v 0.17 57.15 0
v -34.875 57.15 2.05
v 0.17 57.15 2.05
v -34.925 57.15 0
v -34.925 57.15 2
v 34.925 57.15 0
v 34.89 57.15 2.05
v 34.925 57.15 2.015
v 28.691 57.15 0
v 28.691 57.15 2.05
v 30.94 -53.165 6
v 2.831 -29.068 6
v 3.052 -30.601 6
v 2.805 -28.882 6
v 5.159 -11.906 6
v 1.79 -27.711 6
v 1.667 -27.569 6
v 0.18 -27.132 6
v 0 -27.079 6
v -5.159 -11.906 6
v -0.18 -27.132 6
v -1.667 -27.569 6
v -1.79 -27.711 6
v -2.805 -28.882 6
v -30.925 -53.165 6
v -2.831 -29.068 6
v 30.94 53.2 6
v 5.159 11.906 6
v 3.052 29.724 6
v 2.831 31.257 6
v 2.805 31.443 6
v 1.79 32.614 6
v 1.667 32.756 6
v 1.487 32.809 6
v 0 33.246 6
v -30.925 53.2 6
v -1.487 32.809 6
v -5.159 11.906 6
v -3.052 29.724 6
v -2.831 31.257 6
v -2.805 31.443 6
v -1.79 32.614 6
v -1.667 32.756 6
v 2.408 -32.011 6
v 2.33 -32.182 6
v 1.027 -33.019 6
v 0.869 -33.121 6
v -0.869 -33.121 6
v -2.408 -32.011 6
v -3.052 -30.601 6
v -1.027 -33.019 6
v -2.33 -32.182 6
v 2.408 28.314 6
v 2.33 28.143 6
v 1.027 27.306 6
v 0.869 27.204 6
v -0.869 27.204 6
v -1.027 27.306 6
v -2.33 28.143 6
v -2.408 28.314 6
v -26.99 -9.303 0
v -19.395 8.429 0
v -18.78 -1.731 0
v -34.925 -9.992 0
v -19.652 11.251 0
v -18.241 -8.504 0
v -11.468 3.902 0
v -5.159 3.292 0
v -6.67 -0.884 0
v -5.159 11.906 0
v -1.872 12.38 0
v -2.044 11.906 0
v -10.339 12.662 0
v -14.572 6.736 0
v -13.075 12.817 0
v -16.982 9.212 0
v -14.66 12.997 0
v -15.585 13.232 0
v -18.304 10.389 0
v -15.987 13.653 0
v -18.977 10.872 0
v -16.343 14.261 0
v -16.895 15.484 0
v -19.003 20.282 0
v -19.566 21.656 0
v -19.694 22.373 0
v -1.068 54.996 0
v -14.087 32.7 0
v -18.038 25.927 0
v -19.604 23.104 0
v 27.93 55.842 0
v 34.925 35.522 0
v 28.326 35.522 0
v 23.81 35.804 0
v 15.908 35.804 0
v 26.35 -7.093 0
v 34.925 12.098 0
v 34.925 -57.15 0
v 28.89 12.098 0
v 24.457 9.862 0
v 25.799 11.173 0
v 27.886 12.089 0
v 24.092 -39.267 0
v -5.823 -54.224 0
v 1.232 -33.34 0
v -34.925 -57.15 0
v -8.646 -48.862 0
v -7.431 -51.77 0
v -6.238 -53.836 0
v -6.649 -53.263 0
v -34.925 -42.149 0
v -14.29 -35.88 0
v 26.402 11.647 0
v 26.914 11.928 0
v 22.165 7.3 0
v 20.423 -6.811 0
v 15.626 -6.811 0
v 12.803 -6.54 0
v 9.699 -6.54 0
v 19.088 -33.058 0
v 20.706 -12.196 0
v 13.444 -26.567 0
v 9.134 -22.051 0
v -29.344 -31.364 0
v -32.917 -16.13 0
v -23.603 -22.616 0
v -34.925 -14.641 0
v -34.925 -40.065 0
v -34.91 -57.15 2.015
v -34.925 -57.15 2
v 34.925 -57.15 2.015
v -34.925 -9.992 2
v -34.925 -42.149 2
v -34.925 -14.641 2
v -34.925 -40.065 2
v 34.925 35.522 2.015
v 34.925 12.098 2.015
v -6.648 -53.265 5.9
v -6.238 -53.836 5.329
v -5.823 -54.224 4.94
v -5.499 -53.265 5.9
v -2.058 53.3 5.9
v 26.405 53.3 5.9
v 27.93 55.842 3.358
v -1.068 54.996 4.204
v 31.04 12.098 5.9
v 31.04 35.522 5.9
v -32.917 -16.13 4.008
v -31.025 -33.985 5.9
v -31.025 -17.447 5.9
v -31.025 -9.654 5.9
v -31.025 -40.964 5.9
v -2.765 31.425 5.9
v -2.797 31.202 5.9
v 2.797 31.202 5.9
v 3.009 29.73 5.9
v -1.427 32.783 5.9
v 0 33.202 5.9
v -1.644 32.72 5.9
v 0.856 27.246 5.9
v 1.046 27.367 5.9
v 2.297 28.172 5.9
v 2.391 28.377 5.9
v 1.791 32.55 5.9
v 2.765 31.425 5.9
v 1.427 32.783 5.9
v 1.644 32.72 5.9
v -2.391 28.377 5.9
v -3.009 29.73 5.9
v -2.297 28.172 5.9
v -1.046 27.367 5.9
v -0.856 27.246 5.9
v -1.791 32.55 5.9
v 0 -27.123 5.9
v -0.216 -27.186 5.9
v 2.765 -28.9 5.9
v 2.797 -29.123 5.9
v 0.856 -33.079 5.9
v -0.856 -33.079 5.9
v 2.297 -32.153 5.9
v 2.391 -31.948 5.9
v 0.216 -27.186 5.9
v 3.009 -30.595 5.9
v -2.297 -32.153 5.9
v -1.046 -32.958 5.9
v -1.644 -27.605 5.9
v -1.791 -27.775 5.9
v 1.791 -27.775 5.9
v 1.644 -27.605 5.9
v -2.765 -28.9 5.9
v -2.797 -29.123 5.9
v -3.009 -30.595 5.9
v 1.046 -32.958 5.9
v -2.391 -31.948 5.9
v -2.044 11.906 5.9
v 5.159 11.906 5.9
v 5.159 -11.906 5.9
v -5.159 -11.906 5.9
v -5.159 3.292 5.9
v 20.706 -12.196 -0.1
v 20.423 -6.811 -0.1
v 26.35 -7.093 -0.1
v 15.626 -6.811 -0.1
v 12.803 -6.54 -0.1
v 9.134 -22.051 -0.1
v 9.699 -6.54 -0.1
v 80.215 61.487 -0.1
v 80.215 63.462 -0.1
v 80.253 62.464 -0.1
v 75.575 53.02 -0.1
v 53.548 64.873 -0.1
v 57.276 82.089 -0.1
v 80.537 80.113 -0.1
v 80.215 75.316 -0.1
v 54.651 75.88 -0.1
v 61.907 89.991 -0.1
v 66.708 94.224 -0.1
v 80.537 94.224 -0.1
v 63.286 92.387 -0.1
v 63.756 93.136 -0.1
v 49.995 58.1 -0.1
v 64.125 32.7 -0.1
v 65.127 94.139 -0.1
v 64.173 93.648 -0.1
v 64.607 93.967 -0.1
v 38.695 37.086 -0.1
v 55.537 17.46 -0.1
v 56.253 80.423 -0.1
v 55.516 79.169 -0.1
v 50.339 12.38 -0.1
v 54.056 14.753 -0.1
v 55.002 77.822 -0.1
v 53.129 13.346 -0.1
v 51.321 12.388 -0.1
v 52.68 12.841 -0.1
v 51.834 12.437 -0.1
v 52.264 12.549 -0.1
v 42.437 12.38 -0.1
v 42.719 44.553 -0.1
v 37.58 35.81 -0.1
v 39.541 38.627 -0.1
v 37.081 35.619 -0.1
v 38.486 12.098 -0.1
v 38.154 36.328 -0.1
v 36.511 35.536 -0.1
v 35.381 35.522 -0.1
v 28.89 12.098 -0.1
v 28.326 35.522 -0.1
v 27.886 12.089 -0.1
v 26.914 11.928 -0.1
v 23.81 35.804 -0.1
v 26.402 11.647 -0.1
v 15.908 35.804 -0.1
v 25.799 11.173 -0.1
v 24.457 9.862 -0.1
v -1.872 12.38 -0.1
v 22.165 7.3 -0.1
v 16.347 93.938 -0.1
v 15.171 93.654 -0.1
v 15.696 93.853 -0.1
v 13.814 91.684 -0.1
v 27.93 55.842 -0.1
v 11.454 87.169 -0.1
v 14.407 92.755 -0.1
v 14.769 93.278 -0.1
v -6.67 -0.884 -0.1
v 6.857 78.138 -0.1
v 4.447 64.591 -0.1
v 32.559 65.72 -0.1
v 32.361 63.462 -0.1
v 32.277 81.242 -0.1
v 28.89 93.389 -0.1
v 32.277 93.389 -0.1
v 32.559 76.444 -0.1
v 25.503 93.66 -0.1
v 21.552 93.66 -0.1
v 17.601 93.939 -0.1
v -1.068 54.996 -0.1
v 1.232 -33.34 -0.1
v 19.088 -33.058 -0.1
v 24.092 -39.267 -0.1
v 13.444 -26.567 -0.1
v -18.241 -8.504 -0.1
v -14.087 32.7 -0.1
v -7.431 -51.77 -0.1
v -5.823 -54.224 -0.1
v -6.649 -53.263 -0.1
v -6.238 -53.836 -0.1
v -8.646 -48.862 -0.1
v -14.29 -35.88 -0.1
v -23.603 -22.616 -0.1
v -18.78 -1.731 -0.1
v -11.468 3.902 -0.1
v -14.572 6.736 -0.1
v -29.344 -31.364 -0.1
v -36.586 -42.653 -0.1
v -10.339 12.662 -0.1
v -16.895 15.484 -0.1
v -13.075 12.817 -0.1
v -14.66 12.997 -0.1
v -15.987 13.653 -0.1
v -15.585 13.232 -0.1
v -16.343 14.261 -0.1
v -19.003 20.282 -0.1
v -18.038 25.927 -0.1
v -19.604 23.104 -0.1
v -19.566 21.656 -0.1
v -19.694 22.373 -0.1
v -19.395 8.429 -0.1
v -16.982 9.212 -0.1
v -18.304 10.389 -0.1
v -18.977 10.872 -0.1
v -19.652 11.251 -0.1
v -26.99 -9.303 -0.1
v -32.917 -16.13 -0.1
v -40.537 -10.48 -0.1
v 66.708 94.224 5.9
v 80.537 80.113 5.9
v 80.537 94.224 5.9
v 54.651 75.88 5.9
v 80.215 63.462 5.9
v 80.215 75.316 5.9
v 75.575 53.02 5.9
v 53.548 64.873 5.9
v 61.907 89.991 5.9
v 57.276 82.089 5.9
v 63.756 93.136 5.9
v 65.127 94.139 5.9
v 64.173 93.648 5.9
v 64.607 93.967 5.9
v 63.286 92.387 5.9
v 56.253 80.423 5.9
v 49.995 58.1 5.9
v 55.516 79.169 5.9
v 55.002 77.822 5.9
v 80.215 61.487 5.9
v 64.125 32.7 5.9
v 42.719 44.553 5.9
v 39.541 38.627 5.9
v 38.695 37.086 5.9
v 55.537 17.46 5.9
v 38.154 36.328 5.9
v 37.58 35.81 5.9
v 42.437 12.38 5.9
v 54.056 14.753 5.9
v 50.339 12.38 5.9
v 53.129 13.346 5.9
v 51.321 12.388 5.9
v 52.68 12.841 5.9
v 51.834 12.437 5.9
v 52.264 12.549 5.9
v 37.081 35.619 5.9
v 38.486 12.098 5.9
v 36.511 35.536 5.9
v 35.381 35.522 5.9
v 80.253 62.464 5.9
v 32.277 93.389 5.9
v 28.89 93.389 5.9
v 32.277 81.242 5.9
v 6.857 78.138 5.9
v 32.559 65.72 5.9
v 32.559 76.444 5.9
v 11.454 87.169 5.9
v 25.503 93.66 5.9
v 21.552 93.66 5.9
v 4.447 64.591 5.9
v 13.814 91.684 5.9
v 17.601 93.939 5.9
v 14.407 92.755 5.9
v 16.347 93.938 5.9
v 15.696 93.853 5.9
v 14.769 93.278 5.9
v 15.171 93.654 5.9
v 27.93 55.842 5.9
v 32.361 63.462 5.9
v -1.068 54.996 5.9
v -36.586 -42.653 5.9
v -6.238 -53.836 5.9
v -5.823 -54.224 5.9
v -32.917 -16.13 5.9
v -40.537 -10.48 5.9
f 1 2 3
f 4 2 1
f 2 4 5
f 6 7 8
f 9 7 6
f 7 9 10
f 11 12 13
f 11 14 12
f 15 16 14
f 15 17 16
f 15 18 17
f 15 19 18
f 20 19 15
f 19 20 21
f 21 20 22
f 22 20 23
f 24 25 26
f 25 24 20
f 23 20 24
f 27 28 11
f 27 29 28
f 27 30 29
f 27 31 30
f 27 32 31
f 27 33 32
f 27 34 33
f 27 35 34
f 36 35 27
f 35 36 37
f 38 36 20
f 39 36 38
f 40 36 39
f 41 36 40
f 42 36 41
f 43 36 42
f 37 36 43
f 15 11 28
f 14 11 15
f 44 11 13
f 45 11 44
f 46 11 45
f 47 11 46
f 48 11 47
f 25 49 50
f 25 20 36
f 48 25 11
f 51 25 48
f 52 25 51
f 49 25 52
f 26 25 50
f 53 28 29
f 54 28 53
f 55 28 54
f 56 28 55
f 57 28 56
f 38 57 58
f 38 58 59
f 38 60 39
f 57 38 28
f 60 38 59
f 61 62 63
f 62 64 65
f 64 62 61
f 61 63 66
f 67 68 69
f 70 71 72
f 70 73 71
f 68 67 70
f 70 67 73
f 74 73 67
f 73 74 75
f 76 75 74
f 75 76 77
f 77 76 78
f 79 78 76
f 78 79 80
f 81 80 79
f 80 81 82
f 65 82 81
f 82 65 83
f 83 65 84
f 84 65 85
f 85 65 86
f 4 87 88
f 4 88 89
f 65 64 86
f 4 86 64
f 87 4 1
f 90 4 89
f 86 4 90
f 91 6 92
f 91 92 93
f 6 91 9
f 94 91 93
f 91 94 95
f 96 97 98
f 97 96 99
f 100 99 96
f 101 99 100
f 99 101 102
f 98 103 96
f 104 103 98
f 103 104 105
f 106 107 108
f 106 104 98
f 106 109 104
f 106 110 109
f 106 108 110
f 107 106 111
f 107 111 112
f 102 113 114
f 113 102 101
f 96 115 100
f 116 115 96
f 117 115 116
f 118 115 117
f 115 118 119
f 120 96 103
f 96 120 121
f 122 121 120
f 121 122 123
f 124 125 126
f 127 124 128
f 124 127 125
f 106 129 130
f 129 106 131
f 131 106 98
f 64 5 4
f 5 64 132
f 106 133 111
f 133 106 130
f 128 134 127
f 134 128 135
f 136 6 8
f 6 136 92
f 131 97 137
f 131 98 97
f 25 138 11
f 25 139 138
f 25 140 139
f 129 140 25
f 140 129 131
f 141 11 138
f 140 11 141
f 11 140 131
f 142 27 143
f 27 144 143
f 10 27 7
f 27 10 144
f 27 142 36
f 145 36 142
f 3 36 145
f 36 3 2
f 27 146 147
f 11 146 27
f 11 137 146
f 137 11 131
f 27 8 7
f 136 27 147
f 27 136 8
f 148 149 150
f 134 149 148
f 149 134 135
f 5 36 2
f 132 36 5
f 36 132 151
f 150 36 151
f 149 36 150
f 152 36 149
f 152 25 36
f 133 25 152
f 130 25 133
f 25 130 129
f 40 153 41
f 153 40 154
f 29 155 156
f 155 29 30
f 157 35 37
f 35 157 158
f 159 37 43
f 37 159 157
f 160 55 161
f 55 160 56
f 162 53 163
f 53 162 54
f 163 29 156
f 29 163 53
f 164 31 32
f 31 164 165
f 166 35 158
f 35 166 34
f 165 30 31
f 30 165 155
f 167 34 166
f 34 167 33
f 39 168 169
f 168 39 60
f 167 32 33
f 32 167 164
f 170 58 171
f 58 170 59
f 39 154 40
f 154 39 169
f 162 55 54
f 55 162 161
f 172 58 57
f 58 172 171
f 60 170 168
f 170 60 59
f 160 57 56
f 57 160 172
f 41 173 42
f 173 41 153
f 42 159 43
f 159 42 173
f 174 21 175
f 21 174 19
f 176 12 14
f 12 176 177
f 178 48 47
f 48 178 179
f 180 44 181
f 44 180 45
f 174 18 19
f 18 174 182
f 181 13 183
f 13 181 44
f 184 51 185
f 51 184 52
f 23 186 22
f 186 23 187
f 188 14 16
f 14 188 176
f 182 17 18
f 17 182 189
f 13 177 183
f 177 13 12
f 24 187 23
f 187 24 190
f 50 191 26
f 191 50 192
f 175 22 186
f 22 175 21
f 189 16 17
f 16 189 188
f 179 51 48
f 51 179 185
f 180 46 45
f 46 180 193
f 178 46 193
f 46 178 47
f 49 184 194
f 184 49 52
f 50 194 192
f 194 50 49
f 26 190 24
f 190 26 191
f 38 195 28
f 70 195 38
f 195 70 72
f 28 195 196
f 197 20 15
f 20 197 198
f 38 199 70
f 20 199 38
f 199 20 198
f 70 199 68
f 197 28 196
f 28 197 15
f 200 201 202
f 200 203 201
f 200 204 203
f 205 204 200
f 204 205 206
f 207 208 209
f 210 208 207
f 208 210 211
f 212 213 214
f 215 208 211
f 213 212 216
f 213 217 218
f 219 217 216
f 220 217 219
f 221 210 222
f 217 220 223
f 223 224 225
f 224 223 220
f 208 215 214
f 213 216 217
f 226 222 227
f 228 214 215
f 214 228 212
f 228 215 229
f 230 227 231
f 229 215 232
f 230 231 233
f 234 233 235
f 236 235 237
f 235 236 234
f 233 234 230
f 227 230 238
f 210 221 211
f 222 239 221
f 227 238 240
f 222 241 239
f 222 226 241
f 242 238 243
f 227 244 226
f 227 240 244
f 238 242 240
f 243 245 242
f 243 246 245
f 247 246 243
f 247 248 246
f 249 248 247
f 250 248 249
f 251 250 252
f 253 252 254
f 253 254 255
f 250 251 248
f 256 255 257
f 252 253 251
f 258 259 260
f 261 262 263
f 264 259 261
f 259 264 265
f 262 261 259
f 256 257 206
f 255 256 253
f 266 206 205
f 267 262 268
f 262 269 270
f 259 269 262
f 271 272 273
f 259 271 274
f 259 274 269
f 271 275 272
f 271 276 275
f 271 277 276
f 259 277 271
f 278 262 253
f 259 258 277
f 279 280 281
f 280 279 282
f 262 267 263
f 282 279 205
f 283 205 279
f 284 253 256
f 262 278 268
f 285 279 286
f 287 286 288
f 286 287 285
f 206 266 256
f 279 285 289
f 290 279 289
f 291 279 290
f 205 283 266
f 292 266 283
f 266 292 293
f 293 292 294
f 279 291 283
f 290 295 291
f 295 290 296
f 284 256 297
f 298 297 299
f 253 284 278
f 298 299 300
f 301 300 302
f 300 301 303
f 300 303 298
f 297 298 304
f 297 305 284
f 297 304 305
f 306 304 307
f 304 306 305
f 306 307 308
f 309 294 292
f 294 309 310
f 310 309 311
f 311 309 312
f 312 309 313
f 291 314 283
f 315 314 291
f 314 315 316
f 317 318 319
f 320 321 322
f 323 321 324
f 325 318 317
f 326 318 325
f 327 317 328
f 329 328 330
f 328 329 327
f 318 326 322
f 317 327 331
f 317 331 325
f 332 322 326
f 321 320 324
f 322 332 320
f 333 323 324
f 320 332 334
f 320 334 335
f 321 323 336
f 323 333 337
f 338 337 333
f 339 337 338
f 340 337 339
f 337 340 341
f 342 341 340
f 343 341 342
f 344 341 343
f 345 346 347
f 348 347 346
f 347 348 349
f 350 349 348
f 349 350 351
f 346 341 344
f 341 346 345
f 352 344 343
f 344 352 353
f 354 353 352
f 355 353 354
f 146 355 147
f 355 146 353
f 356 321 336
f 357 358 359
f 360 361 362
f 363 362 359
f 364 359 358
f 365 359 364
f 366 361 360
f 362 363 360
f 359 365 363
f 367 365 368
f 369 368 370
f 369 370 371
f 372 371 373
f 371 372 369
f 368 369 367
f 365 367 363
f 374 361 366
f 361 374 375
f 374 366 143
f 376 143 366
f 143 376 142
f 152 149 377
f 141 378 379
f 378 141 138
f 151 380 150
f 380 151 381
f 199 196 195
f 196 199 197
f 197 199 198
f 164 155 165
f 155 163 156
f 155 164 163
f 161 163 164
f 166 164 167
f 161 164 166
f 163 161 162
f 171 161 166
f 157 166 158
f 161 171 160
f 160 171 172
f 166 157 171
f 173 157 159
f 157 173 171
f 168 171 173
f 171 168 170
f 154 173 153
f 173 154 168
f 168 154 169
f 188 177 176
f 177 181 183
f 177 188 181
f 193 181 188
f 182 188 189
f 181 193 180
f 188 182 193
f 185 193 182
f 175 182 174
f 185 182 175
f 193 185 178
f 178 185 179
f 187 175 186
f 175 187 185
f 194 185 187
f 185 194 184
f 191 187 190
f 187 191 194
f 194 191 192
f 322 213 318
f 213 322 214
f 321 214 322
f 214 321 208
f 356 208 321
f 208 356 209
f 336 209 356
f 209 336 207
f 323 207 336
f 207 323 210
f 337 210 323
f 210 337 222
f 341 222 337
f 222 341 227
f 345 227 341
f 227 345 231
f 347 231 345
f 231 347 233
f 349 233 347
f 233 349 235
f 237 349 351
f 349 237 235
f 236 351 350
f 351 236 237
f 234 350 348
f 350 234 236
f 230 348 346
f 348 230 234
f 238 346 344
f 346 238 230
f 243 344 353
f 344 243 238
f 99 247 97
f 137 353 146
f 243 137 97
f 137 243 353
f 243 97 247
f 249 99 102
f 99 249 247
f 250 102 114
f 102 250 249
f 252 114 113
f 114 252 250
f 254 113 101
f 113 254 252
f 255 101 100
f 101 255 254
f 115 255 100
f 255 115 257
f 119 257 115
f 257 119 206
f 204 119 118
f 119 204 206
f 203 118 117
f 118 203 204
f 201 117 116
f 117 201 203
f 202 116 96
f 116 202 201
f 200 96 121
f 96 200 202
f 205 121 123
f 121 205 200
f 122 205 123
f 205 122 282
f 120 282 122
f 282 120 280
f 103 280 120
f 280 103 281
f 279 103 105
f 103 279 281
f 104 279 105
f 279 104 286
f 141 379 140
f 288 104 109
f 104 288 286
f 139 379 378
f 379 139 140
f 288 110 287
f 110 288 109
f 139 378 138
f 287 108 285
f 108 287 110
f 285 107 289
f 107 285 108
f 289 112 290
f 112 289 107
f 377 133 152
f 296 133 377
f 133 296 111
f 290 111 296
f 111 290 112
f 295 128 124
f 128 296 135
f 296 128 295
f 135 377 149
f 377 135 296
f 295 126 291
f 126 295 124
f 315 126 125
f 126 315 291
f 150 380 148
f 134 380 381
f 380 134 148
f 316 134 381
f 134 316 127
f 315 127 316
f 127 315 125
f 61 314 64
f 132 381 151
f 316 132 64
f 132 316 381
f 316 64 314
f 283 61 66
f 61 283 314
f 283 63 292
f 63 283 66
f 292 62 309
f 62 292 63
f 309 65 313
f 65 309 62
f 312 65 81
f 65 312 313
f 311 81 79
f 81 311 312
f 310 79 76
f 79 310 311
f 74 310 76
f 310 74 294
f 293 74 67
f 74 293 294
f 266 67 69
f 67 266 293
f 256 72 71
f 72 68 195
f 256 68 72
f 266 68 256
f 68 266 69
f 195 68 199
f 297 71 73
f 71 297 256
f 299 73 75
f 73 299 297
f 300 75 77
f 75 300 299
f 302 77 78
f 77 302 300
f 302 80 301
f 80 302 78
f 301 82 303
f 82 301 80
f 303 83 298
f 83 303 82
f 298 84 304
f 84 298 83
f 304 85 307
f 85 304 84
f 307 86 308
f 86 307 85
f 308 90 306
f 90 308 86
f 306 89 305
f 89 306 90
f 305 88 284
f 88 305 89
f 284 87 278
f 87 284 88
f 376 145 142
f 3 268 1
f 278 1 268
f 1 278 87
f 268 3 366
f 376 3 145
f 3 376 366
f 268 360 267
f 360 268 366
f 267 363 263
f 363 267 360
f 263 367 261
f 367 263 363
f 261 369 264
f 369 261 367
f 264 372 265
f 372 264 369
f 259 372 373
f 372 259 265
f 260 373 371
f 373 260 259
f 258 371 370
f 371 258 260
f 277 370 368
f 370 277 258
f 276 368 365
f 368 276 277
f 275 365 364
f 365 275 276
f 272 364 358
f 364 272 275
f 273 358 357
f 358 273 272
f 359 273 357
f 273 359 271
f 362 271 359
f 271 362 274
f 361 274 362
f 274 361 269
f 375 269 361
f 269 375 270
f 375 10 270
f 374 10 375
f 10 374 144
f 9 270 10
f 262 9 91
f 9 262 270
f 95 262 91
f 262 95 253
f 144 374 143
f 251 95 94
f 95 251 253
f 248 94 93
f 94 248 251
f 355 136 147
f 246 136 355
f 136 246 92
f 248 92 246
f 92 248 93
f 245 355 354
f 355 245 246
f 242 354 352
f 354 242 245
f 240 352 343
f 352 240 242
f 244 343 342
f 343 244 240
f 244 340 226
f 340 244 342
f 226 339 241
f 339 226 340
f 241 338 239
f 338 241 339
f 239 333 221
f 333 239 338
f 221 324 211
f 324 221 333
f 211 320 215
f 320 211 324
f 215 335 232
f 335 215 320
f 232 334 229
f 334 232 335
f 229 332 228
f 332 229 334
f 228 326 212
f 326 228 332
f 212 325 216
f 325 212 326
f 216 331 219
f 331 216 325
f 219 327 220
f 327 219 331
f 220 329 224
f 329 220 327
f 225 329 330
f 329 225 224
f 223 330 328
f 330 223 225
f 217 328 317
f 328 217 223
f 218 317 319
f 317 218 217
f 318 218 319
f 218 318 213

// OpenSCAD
// file: ../../locations-and-measurements/lam.scad
// Toggle screw holes
module toggle_screws(height_sizes, plate_size)
{
	 translate([height_sizes[plate_size]/2 + 30.1625,0,-1]) cylinder(r=2, h=10, $fn=12);
	 translate([height_sizes[plate_size]/2 + 30.1625,0,3.5]) cylinder(r1=2, r2=3.3, h=3);
	 
	 translate([height_sizes[plate_size]/2 - 30.1625,0,-1]) cylinder(r=2, h=10, $fn=12);
	 translate([height_sizes[plate_size]/2 - 30.1625,0,3.5]) cylinder(r1=2, r2=3.3, h=3);
}
// file: ../../../../basics/rounded-edges/rounded-cube/rounded-cube.scad
/**
 *
 *  some parts of this software were inspired by
 *
 * 	     http://www.thingiverse.com/thing:9347
 *
 */

/**
 * makes a rounded cube
 */
module roundedCube(cornerRadius=4,
				   cubeCentered=false,
				   sides=30,
				   sidesOnly=false,
				   size=[20,20,2])
{
    $fn=sides;

    x = size[0] - cornerRadius/2;
    y = size[1] - cornerRadius/2;
    z = size[2];

    minkowski()
    {
        cube(size=[x,y,z], center=cubeCentered);

        if(sidesOnly)
        {
            cylinder(r=cornerRadius);
        }
        else
        {
            sphere(r=cornerRadius);
        }
    };
}
// file: ../../../../shapes/spurs/spurs-a.scad
// Module names are of the form poly_<inkscape-path-id>().  As a result,
// you can associate a polygon in this OpenSCAD program with the corresponding
// SVG element in the Inkscape document by looking for the XML element with
// the attribute id="inkscape-path-id".

module spur(zLength)
{
  scale([25.4/90, -25.4/90, 2])
//  translate([0, 0, -2])
//  union()
  {
    linear_extrude(height = zLength)
    polygon([[13.500000,-56.000000],[29.500000,-55.000000],[54.500000,-55.000000],[58.503750,-55.048750],[60.522969,-55.341719],[62.290000,-56.020000],[64.325156,-57.853594],[66.241250,-60.541250],[69.240000,-66.000000],[80.500000,-87.000000],[106.280000,-135.000000],[118.870000,-159.000000],[122.780000,-198.000000],[124.023594,-204.882813],[125.843750,-209.652500],[128.457031,-214.095937],[132.080000,-220.000000],[148.490000,-248.000000],[153.376719,-256.487656],[155.041895,-259.143652],[156.518750,-260.956250],[158.055137,-262.086816],[159.898906,-262.696719],[165.500000,-263.000000],[214.500000,-263.000000],[214.500000,-213.000000],[213.360000,-196.000000],[213.360000,-154.000000],[213.495000,-150.462500],[213.360000,-147.000000],[196.920000,-117.000000],[156.350000,-45.000000],[125.920000,9.000000],[120.671250,18.592500],[117.385469,23.577187],[115.794199,25.366055],[114.320000,26.400000],[112.797344,26.797500],[110.981250,26.970000],[107.500000,27.000000],[79.500000,27.000000],[65.500000,28.000000],[31.500000,28.000000],[27.943750,28.030000],[24.500000,28.600000],[22.684180,29.597539],[20.548438,31.277812],[15.792500,35.922500],[7.670000,45.000000],[-36.500000,94.040000],[-25.500000,94.040000],[-15.500000,95.000000],[1.500000,95.000000],[22.500000,96.000000],[2.500000,114.080000],[-38.500000,149.000000],[-23.230000,165.000000],[-3.230000,188.000000],[14.500000,210.000000],[-66.500000,189.000000],[-91.500000,263.000000],[-92.970664,261.624141],[-94.426562,259.592500],[-97.197500,254.302500],[-101.500000,244.000000],[-121.500000,198.000000],[-200.500000,222.000000],[-174.840000,182.000000],[-154.500000,151.000000],[-187.500000,128.020000],[-214.500000,108.000000],[-166.500000,103.830000],[-135.500000,101.000000],[-137.410000,77.000000],[-139.590000,41.000000],[-140.500000,31.000000],[-138.108496,32.343340],[-135.722969,34.055469],[-131.038750,38.223750],[-122.500000,47.000000],[-111.500000,57.040000],[-94.500000,74.000000],[-77.500000,27.000000],[-107.500000,26.000000],[-117.196250,25.451250],[-122.812656,24.814531],[-126.090000,23.980000],[-127.513906,22.488438],[-128.773750,20.335000],[-130.730000,16.000000],[-138.200000,-1.000000],[-140.195000,-5.868750],[-140.649688,-8.406719],[-140.330000,-11.000000],[-134.780000,-21.000000],[-120.780000,-45.000000],[-74.650000,-124.000000],[-55.110000,-158.000000],[-46.570000,-206.000000],[-30.280000,-238.000000],[-21.920000,-254.000000],[-19.818750,-257.793750],[-18.535156,-259.646094],[-17.110000,-260.980000],[-15.251406,-261.684844],[-12.943750,-261.983750],[-8.500000,-261.990000],[5.500000,-261.000000],[19.500000,-261.000000],[31.500000,-260.040000],[43.500000,-260.040000],[43.500000,-217.000000],[44.500000,-200.000000],[44.500000,-162.000000],[43.800000,-154.000000],[28.100000,-127.000000],[-14.500000,-56.000000],[13.500000,-56.000000]]);
  }
}

module spurThumbnail(height = 1)
{
    xyScale = 0.164;
    translate([0,0,4])
    scale([xyScale, xyScale, 1])
    spur(zLength = height);
}
// main file
use <../../power-outltet-cover.scad>

use <../../../../shapes/spurs/spurs-a.scad>

union()
{
    color("white")
    powerOutletCover(1st_plate = "toggle",
                    chargerStand = false);

    spurLogo();
}

module spurLogo()
{
    color("orange")
    translate([20, 20, -0.10])
    spur(zLength=3);
}
